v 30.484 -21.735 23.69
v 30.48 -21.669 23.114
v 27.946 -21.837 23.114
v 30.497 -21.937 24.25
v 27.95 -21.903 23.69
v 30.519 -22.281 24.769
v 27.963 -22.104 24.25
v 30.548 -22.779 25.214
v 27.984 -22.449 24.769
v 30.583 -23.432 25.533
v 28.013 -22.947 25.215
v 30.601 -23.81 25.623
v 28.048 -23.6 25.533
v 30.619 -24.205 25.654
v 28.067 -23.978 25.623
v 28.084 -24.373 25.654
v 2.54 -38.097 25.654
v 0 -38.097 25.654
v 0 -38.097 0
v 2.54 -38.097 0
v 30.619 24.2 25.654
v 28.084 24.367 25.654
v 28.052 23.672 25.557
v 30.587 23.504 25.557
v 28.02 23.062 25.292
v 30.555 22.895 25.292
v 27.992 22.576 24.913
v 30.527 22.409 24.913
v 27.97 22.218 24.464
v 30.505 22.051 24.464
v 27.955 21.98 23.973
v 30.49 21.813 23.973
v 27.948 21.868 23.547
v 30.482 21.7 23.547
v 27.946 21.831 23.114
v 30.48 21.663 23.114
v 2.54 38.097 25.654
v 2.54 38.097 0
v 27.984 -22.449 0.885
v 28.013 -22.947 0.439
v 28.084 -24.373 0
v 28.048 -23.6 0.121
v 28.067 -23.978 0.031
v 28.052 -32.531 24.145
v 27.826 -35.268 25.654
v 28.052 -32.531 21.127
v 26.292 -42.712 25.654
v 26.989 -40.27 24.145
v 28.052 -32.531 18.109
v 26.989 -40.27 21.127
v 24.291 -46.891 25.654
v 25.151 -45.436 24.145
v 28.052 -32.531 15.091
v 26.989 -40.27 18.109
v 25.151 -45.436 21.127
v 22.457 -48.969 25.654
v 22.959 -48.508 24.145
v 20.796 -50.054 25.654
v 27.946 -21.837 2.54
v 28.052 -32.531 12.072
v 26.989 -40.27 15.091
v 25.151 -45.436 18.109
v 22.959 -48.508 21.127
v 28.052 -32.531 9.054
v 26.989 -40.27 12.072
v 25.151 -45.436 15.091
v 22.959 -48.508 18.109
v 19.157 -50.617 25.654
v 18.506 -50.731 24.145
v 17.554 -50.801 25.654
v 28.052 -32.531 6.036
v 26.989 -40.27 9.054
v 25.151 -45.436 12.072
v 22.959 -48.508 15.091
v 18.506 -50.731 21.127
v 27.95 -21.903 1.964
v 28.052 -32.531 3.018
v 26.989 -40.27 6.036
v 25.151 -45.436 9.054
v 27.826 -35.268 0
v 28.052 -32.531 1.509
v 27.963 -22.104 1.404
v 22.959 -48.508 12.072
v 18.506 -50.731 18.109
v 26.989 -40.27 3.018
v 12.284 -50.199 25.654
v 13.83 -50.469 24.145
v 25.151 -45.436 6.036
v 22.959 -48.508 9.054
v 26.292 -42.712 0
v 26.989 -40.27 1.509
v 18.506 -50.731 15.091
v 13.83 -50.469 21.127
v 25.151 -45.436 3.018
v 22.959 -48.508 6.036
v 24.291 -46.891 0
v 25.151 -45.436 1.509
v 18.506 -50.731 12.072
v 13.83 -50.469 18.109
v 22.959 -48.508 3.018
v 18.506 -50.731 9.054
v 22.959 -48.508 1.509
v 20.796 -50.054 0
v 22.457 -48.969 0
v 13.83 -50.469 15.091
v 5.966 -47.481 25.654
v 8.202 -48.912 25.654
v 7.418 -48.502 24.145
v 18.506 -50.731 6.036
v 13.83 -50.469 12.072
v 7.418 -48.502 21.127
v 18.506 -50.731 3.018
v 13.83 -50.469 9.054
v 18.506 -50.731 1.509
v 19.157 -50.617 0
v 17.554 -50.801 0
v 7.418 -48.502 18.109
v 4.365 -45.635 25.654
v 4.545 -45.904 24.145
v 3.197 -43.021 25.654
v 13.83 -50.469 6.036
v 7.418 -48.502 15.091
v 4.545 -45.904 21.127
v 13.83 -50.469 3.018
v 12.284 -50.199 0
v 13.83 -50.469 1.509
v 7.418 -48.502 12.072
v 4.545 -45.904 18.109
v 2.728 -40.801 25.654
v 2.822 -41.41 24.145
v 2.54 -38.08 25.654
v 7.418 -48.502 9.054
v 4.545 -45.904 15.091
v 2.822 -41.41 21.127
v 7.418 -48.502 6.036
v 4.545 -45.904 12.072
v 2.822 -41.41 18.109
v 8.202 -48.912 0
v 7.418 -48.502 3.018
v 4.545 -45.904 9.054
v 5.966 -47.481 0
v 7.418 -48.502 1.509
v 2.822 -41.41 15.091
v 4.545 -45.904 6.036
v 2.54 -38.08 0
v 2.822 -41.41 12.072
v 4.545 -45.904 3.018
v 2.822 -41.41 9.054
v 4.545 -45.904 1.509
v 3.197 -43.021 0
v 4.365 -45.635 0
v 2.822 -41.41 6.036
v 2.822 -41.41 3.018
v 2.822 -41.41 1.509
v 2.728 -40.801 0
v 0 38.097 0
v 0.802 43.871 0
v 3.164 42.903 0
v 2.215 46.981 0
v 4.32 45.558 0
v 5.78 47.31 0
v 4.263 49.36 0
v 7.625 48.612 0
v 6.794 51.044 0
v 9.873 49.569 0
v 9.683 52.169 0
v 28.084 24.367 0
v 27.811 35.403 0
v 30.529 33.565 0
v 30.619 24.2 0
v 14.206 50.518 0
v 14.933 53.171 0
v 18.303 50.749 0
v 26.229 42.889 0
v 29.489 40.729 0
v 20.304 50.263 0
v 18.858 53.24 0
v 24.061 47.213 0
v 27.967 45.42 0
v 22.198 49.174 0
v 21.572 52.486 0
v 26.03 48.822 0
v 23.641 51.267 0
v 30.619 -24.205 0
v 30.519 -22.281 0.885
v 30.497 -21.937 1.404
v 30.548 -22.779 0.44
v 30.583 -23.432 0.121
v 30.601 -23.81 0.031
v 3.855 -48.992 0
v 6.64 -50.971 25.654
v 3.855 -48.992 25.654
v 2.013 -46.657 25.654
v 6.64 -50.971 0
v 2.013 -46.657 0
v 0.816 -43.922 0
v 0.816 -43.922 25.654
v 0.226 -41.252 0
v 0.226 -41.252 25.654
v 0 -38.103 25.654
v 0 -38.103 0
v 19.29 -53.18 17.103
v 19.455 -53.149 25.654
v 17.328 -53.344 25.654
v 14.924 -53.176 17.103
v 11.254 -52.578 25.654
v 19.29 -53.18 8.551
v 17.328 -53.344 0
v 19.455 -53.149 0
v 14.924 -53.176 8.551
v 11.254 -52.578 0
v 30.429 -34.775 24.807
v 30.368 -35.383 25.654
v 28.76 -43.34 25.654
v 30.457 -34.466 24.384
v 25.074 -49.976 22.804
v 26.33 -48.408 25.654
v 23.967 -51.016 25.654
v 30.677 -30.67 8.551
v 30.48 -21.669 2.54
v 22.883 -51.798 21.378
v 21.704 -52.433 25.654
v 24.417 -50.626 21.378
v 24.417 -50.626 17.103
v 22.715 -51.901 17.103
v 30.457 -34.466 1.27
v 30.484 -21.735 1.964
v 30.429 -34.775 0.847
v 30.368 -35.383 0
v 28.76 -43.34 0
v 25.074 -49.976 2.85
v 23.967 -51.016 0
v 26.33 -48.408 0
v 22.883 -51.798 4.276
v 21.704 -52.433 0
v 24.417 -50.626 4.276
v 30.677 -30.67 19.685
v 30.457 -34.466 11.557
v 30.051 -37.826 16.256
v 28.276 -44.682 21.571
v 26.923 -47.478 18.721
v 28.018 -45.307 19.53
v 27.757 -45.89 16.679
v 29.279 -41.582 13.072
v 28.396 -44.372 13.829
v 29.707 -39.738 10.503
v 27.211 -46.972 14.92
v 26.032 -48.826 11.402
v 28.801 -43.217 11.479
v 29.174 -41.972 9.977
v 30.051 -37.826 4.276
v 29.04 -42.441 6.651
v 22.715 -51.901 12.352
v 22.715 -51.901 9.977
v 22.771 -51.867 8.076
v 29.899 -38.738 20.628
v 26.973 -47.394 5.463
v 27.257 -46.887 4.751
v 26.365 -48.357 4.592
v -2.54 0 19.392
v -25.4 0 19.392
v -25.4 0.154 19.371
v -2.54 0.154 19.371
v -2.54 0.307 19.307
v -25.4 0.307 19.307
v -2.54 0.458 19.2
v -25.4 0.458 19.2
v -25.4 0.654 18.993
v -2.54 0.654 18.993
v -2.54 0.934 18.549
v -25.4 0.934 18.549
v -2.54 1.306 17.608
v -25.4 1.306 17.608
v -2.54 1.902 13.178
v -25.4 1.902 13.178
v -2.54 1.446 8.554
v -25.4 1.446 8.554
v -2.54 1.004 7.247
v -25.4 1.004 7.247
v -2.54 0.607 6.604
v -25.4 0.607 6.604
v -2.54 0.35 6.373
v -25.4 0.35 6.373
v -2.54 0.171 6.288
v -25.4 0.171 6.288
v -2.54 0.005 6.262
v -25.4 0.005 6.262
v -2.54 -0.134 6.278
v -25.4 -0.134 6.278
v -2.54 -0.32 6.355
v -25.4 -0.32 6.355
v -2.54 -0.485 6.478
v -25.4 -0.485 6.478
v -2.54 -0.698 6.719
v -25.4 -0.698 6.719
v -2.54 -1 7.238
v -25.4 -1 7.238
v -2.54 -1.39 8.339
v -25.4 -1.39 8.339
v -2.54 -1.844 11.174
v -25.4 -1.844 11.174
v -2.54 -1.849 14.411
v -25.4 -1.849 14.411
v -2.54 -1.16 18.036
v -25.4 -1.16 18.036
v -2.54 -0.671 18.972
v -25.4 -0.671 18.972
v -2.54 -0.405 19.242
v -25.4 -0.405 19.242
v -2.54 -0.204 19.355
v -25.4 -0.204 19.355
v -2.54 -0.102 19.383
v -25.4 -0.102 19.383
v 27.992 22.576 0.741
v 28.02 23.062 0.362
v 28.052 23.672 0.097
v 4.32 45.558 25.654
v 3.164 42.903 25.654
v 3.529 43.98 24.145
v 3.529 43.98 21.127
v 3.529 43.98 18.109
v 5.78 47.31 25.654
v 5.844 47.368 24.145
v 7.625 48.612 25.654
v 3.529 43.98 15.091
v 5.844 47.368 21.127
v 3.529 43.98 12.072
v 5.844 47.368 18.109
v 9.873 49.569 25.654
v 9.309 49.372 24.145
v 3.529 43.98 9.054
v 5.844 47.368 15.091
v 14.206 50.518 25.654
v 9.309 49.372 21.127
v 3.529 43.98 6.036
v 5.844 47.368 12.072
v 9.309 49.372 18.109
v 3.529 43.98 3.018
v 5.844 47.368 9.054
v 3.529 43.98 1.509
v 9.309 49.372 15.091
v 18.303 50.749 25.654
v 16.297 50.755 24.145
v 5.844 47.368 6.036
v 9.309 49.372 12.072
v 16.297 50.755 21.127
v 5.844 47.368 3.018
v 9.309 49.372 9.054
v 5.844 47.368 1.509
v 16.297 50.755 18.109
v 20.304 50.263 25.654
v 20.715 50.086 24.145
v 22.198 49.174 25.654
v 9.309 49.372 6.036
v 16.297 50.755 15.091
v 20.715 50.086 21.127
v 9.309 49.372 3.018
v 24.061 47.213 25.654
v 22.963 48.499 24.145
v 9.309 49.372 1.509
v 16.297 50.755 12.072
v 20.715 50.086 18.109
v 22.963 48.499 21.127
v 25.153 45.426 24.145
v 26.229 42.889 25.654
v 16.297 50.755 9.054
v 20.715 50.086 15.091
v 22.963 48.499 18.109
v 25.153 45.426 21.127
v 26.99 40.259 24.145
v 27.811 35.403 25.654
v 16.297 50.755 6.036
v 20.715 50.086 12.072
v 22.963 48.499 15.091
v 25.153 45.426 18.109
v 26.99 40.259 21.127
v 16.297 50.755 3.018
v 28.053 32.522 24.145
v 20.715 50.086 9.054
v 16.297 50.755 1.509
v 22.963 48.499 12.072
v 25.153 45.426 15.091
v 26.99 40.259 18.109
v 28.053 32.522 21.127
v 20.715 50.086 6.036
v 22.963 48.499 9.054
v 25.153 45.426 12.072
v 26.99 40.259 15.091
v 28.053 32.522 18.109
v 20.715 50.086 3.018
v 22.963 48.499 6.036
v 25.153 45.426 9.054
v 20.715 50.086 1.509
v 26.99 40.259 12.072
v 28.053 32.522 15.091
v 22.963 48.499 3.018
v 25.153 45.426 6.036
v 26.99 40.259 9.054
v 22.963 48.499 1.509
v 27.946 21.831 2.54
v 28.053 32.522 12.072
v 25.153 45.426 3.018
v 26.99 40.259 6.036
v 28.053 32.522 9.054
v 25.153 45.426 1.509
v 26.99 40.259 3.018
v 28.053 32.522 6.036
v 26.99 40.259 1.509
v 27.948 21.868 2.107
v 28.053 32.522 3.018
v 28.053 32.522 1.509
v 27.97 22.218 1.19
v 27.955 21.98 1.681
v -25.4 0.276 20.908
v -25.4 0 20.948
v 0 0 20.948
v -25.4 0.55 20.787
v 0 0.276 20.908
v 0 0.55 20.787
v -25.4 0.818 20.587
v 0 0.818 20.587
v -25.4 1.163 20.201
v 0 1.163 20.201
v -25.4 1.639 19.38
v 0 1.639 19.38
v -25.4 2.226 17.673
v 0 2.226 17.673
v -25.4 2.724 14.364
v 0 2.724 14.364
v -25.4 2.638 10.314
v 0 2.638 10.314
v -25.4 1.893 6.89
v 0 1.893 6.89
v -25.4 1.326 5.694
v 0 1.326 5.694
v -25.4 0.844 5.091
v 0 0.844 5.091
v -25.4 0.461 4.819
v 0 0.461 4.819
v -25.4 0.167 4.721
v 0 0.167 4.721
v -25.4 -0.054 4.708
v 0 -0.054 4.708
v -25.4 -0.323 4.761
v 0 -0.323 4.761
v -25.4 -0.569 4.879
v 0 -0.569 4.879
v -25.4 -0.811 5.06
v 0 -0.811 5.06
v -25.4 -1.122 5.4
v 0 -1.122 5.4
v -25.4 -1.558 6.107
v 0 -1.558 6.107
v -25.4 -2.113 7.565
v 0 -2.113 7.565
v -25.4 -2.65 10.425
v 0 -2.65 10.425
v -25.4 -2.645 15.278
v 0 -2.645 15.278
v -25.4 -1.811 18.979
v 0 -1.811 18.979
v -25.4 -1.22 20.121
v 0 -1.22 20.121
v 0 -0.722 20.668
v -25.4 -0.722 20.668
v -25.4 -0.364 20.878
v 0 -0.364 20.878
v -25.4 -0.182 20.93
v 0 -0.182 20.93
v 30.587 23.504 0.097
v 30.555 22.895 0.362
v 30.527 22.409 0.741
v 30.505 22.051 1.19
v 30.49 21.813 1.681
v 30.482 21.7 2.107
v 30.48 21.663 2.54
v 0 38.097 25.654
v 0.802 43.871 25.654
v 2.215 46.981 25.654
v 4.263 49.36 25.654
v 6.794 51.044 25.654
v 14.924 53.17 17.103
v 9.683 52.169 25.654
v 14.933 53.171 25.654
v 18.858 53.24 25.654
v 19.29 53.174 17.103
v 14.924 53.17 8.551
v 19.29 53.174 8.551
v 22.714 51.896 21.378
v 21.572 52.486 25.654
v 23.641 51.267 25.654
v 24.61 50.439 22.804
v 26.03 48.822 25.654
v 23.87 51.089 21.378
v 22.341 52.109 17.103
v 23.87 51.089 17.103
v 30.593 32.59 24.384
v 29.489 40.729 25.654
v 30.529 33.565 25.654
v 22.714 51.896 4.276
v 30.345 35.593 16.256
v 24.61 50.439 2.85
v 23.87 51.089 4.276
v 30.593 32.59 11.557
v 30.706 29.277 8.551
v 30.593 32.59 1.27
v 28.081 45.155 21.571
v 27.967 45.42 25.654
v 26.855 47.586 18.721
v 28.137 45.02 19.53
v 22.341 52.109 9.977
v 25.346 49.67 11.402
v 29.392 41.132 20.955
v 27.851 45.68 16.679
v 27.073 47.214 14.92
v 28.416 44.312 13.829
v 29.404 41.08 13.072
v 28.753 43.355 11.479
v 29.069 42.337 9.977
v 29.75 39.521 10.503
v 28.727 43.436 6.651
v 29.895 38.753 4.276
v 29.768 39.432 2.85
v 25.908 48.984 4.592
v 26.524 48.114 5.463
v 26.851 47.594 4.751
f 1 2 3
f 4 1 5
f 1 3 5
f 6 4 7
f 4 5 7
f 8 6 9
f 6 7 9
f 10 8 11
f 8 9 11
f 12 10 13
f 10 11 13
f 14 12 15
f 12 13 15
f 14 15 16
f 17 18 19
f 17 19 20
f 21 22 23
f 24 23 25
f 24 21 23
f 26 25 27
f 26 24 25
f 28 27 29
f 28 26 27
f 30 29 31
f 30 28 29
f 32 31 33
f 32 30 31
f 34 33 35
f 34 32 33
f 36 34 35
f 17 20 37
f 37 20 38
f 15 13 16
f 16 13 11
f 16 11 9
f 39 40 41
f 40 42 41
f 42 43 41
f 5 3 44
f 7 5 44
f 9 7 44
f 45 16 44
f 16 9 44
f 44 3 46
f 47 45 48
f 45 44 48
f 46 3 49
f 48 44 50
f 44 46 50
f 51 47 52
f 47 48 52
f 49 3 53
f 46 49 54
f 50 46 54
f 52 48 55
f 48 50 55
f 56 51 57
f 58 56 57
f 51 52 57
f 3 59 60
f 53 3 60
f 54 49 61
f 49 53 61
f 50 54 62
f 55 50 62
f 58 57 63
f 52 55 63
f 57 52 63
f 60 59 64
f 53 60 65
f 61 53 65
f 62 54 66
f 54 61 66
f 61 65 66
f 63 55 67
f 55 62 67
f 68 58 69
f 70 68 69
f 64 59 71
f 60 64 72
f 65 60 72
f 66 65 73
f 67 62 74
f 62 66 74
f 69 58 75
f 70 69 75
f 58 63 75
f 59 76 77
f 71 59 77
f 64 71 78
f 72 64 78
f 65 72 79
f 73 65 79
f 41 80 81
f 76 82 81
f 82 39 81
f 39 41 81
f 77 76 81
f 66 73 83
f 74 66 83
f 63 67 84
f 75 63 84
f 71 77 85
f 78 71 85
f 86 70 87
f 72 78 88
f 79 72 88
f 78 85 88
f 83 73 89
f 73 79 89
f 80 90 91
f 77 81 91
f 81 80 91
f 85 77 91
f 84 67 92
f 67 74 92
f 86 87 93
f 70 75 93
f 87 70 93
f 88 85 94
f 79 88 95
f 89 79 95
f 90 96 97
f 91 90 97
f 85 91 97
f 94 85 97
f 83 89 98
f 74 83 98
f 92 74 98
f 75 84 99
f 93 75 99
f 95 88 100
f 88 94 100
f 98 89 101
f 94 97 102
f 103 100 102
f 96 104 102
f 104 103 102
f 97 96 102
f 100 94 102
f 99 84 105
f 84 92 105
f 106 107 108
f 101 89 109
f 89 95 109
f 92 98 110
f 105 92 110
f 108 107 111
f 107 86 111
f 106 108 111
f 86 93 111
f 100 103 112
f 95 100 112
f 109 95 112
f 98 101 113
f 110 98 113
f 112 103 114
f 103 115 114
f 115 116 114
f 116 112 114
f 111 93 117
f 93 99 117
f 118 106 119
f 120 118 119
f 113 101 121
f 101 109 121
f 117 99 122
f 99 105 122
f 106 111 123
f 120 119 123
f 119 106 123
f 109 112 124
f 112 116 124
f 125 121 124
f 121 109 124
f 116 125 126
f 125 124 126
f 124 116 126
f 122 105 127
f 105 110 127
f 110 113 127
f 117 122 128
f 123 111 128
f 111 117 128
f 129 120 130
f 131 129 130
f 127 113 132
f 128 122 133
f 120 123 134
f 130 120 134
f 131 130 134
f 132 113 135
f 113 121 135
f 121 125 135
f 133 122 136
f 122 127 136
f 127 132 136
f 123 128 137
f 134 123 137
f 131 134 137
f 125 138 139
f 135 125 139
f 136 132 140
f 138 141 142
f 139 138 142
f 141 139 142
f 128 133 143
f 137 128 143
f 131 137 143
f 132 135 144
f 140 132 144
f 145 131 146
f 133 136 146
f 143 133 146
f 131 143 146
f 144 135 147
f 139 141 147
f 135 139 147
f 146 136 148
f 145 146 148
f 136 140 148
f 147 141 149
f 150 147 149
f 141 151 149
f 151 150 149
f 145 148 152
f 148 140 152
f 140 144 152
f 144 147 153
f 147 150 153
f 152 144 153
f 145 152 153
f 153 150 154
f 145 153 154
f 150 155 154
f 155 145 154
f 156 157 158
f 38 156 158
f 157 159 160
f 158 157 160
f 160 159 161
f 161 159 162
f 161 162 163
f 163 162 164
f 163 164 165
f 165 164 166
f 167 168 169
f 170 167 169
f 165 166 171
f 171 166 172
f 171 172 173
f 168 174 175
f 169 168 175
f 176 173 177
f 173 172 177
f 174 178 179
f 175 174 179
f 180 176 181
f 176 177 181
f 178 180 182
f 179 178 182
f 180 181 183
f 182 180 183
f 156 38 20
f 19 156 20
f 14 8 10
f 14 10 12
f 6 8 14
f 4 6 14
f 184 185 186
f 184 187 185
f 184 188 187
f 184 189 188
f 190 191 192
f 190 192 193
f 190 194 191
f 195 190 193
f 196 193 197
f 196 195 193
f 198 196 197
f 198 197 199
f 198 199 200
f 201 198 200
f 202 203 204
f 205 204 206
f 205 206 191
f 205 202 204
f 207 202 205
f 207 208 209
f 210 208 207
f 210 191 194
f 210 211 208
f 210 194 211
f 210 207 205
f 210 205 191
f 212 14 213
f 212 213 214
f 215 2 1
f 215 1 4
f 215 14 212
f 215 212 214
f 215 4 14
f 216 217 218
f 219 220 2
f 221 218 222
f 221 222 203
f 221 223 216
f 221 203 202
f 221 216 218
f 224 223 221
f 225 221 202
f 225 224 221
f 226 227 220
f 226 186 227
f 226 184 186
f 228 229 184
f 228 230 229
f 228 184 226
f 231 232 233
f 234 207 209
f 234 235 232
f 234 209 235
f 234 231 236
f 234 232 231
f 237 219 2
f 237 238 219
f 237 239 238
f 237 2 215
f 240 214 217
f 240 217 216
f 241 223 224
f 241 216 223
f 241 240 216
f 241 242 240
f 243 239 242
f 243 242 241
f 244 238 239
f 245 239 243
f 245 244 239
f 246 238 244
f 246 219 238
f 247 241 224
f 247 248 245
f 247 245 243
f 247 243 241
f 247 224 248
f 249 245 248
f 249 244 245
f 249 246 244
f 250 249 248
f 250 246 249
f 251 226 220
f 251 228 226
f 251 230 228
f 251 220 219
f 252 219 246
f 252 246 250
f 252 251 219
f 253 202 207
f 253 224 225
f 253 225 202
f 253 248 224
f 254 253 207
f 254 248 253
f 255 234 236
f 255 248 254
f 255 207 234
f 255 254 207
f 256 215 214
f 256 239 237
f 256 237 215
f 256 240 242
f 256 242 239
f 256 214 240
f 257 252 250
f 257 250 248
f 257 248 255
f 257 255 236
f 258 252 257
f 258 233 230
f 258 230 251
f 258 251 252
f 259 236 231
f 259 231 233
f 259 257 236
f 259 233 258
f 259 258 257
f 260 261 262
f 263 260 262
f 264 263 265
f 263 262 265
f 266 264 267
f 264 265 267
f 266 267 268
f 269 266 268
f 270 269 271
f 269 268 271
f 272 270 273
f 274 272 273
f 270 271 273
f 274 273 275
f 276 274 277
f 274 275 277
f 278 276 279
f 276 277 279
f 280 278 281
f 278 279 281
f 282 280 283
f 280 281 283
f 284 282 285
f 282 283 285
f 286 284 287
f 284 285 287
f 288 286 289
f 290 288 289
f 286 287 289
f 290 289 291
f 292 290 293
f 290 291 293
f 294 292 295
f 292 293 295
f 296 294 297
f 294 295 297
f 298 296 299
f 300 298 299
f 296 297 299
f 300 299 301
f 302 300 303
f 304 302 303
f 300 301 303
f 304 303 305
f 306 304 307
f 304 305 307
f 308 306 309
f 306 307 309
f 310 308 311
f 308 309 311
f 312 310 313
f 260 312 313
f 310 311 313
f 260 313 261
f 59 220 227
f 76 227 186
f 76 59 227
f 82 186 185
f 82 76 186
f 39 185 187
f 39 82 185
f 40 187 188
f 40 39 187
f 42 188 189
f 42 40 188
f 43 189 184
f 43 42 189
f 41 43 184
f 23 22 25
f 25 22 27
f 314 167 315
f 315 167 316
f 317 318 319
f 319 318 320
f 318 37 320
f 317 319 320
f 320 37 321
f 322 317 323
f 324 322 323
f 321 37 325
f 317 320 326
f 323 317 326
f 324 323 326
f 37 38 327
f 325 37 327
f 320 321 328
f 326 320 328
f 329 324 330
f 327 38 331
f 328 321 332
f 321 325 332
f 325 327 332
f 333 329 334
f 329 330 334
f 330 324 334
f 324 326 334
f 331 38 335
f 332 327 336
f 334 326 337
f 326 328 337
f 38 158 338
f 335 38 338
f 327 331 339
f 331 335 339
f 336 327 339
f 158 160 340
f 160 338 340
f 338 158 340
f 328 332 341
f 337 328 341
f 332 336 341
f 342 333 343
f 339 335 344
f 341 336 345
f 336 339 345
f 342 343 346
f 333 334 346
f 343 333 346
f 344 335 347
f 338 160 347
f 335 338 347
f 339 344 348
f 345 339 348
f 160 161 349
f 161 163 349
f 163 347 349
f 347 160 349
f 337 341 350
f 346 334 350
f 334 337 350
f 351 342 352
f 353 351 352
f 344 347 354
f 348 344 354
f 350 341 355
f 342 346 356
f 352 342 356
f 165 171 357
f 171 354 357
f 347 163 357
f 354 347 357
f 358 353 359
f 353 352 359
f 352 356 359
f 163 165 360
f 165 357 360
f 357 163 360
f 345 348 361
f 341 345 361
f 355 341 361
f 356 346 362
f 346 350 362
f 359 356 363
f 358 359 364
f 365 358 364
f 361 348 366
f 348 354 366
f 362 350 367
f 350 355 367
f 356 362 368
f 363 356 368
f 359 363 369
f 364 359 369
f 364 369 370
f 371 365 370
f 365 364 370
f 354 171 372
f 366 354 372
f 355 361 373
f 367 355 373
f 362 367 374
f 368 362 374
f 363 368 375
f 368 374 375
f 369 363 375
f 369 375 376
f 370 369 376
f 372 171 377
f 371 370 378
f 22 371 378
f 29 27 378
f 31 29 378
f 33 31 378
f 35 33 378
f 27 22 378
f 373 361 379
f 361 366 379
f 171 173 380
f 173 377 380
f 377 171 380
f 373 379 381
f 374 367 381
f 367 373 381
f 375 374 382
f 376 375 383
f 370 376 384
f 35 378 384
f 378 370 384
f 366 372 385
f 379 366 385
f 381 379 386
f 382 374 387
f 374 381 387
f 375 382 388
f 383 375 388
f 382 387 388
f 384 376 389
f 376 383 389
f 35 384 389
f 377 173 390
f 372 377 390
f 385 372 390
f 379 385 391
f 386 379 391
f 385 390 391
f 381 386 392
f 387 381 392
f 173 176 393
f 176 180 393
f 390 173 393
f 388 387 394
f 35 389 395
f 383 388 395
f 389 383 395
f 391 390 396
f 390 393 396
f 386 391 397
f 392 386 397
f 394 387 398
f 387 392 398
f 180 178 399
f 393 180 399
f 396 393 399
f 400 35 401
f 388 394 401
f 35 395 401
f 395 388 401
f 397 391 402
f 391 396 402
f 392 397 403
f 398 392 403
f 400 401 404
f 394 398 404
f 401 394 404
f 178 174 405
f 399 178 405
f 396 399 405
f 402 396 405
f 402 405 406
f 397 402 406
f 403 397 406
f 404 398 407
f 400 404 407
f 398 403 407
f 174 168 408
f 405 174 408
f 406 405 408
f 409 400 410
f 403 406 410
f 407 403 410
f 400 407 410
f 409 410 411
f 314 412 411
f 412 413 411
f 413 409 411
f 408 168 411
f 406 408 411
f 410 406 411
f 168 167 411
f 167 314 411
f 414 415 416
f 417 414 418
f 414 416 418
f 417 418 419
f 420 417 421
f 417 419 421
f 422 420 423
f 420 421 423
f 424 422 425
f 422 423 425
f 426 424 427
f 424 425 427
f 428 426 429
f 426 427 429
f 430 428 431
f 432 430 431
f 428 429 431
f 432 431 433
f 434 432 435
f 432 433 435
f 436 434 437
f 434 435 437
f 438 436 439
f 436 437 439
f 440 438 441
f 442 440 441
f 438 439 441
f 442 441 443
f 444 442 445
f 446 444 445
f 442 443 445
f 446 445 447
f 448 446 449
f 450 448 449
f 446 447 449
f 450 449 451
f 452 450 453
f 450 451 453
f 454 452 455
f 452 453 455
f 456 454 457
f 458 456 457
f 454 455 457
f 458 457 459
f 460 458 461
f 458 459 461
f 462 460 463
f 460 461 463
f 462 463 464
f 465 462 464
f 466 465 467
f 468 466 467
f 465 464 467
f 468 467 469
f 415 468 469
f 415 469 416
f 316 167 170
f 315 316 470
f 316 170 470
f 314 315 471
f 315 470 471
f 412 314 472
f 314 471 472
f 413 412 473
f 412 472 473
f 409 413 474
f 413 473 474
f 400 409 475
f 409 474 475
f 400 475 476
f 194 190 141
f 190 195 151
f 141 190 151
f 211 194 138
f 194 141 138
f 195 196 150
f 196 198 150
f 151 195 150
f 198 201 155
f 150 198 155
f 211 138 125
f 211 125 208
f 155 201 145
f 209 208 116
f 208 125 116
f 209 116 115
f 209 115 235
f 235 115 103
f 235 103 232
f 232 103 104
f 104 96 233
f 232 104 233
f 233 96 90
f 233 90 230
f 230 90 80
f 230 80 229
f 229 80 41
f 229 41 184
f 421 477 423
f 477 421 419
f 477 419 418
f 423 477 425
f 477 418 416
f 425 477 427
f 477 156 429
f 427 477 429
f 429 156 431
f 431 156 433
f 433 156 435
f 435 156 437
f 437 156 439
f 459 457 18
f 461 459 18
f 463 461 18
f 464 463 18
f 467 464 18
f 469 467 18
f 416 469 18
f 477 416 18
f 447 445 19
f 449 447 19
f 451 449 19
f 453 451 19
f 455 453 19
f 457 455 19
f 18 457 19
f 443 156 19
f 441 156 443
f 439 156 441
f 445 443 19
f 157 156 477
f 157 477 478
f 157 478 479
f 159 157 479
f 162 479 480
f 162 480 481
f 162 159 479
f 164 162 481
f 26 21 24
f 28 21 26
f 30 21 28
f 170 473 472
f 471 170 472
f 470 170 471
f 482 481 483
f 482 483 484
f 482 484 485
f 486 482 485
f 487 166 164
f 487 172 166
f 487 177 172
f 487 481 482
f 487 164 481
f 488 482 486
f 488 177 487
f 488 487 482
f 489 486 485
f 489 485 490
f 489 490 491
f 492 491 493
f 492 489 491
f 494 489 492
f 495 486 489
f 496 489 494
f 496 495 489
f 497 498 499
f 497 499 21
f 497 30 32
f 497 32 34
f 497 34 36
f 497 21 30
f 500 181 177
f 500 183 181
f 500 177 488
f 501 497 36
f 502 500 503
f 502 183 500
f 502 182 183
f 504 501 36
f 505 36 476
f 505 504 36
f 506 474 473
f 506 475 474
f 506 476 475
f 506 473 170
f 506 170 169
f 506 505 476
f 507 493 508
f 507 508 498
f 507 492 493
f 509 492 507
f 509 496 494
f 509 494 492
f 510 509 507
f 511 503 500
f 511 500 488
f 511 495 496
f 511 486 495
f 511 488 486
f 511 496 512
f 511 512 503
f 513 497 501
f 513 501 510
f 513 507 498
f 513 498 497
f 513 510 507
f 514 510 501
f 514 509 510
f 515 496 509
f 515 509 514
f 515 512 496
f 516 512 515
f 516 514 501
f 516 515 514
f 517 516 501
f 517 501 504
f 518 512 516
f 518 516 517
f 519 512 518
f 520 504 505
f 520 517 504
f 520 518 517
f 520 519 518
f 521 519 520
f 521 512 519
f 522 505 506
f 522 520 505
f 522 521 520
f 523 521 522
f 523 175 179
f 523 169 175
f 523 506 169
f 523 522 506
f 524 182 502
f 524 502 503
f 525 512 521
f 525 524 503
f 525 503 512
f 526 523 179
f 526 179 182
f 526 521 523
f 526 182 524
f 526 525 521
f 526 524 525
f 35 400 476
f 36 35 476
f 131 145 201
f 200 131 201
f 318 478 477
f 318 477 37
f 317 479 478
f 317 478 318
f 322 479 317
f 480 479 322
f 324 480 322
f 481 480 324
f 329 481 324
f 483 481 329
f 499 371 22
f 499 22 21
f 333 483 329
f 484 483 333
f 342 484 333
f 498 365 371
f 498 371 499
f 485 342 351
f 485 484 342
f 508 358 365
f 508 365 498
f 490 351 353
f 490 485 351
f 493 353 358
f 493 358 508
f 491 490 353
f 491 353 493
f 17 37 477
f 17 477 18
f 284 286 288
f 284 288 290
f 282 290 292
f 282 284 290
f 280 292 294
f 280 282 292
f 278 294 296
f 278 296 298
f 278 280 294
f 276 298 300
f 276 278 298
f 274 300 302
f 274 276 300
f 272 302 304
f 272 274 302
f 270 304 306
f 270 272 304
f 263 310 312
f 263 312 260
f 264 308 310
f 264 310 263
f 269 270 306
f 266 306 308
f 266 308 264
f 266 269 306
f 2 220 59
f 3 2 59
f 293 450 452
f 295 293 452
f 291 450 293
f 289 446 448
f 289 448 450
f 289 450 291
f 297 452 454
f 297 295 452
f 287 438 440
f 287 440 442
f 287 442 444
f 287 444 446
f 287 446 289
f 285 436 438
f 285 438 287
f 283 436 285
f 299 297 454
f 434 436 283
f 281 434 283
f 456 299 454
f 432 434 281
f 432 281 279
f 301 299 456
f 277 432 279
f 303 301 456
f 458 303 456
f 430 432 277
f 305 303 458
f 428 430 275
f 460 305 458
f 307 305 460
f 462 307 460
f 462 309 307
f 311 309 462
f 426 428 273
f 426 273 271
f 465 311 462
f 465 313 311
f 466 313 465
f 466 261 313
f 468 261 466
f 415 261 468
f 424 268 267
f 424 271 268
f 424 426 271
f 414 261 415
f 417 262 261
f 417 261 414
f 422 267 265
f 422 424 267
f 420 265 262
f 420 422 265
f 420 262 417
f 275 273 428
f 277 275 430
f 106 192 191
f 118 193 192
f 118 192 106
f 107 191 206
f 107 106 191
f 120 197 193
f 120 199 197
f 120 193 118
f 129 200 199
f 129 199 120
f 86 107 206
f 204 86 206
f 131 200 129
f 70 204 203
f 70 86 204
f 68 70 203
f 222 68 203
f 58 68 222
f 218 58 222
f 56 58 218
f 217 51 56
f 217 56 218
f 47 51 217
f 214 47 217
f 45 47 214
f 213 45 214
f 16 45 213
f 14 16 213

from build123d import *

# Parameters (mm, degrees)
EXTRUDE_THIN1_DEPTH   = 25.654
EXTRUDE_THIN1_2_DEPTH = 25.654
SKETCH4_RX            = 8.120921881
SKETCH4_RY            = 2.774524796
BOSS_EXTRUDE1_DEPTH   = 25.4
SKETCH5_RX            = 6.565465979
SKETCH5_RY            = 1.905
CUT_EXTRUDE1_DEPTH    = 22.86
FILLET1_R             = 2.54
FILLET2_R             = 2.54


# Read off the part's stored shape, not the designer's step: Extrude-Thin1
with BuildPart() as part:
    # Extrude-Thin1 outline → Extrude-Thin1 (new body)
    with BuildSketch(Plane.XY):
        with BuildLine():
            Line((30.48, -21.66914096), (27.945531504, -21.836680329))
            add(Edge.make_bspline(
                [(27.945531504, -21.836680329), (28.216439415, -25.93486673), (28.23252486, -29.479469819), (27.872267932, -35.583082717), (27.495669128, -38.141627179), (26.481717741, -42.397642841), (25.844975686, -44.093807332), (24.457217637, -46.778355936), (23.709075743, -47.767064676), (22.209275028, -49.249054272), (21.456334771, -49.746827821), (19.965368397, -50.441349655), (19.225863185, -50.636243836), (17.786990757, -50.824907544), (17.07083353, -50.820409838), (16.095443713, -50.745282939), (15.896649021, -50.726788865), (15.490503236, -50.684553576), (15.281414749, -50.660661788), (14.653166379, -50.585312237), (14.238591647, -50.53015824), (12.194702947, -50.223727073), (10.654009092, -49.877340199), (8.625229356, -49.123559812), (7.995829874, -48.834151782), (6.840720894, -48.169639667), (6.314943902, -47.795162364), (5.360454433, -46.940512269), (4.930828424, -46.460464413), (4.158987377, -45.347819896), (3.816278634, -44.714238293), (3.232884788, -43.233869293), (2.992795748, -42.386537786), (2.651749825, -40.433365024), (2.551277196, -39.327787262), (2.539894361, -38.079751671)],
                knots=[0, 0, 0, 0, 0.0625, 0.0625, 0.125, 0.125, 0.1875, 0.1875, 0.25, 0.25, 0.3125, 0.3125, 0.375, 0.375, 0.4375, 0.4375, 0.453125, 0.453125, 0.46875, 0.46875, 0.5, 0.5, 0.625, 0.625, 0.6875, 0.6875, 0.75, 0.75, 0.8125, 0.8125, 0.875, 0.875, 0.9375, 0.9375, 1, 1, 1, 1], degree=3))
            Line((2.539894361, -38.079751671), (0, -38.102917034))
            add(Edge.make_bspline(
                [(30.48, -21.66914096), (32.097084155, -46.13174249), (22.932616936, -53.850579007), (8.743728035, -52.754122664), (0.106968945, -49.831194873), (0, -38.102917034)],
                knots=[0, 0, 0, 0, 0.365105408, 0.465105408, 1, 1, 1, 1], degree=3))
        make_face()
    extrude(amount=EXTRUDE_THIN1_DEPTH)

    # Fillet2
    fillet2_edges = [part.edges().sort_by_distance(p)[0] for p in [
        (29.212765752, -21.752910644, 25.654),
        (29.212765752, -21.752910644, 0),
    ]]
    fillet(fillet2_edges, radius=FILLET2_R)


with BuildPart() as body_2:
    # Extrude-Thin1 2 outline → Extrude-Thin1 2 (new body)
    with BuildSketch(Plane.XY):
        with BuildLine():
            Line((2.54, -38.097082966), (2.54, 38.097082966))
            add(Edge.make_bspline(
                [(2.54, 38.097082966), (2.55247561, 39.342882783), (2.653861042, 40.44639958), (2.996393497, 42.395844424), (3.237054423, 43.241511707), (3.821349871, 44.719012561), (4.164392201, 45.351394795), (4.936827462, 46.462062079), (5.366719378, 46.941327746), (6.321733103, 47.794653487), (6.847764322, 48.168583404), (8.003299385, 48.832110701), (8.632867302, 49.121083114), (10.66193968, 49.873691678), (12.202532613, 50.219488822), (14.245995135, 50.525427878), (14.660470529, 50.580495346), (15.288551787, 50.655731835), (15.497412831, 50.67956491), (15.903211301, 50.721667454), (16.10184127, 50.740086851), (17.076455676, 50.814812135), (17.792148896, 50.818917668), (19.230547776, 50.629398095), (19.96987556, 50.434038624), (21.460319225, 49.738590728), (22.212989851, 49.240331772), (23.712183679, 47.757387511), (24.45997348, 46.768216796), (25.846937805, 44.083068815), (26.483244577, 42.386773153), (27.496414466, 38.131062208), (27.872669783, 35.572950748), (28.232498094, 29.470917951), (28.216327109, 25.927460772), (27.945531504, 21.830846261)],
                knots=[0, 0, 0, 0, 0.0625, 0.0625, 0.125, 0.125, 0.1875, 0.1875, 0.25, 0.25, 0.3125, 0.3125, 0.375, 0.375, 0.5, 0.5, 0.53125, 0.53125, 0.546875, 0.546875, 0.5625, 0.5625, 0.625, 0.625, 0.6875, 0.6875, 0.75, 0.75, 0.8125, 0.8125, 0.875, 0.875, 0.9375, 0.9375, 1, 1, 1, 1], degree=3))
            Line((27.945531504, 21.830846261), (30.48, 21.663306891))
            add(Edge.make_bspline(
                [(0, 38.097082966), (0.106968945, 49.825360805), (8.743728035, 52.748288596), (22.932616936, 53.844744939), (32.097084155, 46.125908422), (30.48, 21.663306891)],
                knots=[0, 0, 0, 0, 0.534894592, 0.634894592, 1, 1, 1, 1], degree=3))
            Line((0, 38.097082966), (0, -38.097082966))
            Line((0, -38.097082966), (2.54, -38.097082966))
        make_face()
    extrude(amount=EXTRUDE_THIN1_2_DEPTH)

    # Sketch4 → Boss-Extrude1 (add)
    with BuildSketch(Plane.ZY):
        with Locations((12.827, 0)):
            Ellipse(SKETCH4_RX, SKETCH4_RY)
    extrude(amount=BOSS_EXTRUDE1_DEPTH)

    # Sketch5 → Cut-Extrude1 (cut)
    with BuildSketch(Plane.ZY.offset(25.4)):
        with Locations((12.827, 0)):
            Ellipse(SKETCH5_RX, SKETCH5_RY)
    extrude(amount=-CUT_EXTRUDE1_DEPTH, mode=Mode.SUBTRACT)

    # Fillet1
    fillet1_edges = [body_2.edges().sort_by_distance(p)[0] for p in [
        (29.212765752, 21.747076576, 0),
        (29.212765752, 21.747076576, 25.654),
    ]]
    fillet(fillet1_edges, radius=FILLET1_R)


solid = Compound([part.part, body_2.part])
